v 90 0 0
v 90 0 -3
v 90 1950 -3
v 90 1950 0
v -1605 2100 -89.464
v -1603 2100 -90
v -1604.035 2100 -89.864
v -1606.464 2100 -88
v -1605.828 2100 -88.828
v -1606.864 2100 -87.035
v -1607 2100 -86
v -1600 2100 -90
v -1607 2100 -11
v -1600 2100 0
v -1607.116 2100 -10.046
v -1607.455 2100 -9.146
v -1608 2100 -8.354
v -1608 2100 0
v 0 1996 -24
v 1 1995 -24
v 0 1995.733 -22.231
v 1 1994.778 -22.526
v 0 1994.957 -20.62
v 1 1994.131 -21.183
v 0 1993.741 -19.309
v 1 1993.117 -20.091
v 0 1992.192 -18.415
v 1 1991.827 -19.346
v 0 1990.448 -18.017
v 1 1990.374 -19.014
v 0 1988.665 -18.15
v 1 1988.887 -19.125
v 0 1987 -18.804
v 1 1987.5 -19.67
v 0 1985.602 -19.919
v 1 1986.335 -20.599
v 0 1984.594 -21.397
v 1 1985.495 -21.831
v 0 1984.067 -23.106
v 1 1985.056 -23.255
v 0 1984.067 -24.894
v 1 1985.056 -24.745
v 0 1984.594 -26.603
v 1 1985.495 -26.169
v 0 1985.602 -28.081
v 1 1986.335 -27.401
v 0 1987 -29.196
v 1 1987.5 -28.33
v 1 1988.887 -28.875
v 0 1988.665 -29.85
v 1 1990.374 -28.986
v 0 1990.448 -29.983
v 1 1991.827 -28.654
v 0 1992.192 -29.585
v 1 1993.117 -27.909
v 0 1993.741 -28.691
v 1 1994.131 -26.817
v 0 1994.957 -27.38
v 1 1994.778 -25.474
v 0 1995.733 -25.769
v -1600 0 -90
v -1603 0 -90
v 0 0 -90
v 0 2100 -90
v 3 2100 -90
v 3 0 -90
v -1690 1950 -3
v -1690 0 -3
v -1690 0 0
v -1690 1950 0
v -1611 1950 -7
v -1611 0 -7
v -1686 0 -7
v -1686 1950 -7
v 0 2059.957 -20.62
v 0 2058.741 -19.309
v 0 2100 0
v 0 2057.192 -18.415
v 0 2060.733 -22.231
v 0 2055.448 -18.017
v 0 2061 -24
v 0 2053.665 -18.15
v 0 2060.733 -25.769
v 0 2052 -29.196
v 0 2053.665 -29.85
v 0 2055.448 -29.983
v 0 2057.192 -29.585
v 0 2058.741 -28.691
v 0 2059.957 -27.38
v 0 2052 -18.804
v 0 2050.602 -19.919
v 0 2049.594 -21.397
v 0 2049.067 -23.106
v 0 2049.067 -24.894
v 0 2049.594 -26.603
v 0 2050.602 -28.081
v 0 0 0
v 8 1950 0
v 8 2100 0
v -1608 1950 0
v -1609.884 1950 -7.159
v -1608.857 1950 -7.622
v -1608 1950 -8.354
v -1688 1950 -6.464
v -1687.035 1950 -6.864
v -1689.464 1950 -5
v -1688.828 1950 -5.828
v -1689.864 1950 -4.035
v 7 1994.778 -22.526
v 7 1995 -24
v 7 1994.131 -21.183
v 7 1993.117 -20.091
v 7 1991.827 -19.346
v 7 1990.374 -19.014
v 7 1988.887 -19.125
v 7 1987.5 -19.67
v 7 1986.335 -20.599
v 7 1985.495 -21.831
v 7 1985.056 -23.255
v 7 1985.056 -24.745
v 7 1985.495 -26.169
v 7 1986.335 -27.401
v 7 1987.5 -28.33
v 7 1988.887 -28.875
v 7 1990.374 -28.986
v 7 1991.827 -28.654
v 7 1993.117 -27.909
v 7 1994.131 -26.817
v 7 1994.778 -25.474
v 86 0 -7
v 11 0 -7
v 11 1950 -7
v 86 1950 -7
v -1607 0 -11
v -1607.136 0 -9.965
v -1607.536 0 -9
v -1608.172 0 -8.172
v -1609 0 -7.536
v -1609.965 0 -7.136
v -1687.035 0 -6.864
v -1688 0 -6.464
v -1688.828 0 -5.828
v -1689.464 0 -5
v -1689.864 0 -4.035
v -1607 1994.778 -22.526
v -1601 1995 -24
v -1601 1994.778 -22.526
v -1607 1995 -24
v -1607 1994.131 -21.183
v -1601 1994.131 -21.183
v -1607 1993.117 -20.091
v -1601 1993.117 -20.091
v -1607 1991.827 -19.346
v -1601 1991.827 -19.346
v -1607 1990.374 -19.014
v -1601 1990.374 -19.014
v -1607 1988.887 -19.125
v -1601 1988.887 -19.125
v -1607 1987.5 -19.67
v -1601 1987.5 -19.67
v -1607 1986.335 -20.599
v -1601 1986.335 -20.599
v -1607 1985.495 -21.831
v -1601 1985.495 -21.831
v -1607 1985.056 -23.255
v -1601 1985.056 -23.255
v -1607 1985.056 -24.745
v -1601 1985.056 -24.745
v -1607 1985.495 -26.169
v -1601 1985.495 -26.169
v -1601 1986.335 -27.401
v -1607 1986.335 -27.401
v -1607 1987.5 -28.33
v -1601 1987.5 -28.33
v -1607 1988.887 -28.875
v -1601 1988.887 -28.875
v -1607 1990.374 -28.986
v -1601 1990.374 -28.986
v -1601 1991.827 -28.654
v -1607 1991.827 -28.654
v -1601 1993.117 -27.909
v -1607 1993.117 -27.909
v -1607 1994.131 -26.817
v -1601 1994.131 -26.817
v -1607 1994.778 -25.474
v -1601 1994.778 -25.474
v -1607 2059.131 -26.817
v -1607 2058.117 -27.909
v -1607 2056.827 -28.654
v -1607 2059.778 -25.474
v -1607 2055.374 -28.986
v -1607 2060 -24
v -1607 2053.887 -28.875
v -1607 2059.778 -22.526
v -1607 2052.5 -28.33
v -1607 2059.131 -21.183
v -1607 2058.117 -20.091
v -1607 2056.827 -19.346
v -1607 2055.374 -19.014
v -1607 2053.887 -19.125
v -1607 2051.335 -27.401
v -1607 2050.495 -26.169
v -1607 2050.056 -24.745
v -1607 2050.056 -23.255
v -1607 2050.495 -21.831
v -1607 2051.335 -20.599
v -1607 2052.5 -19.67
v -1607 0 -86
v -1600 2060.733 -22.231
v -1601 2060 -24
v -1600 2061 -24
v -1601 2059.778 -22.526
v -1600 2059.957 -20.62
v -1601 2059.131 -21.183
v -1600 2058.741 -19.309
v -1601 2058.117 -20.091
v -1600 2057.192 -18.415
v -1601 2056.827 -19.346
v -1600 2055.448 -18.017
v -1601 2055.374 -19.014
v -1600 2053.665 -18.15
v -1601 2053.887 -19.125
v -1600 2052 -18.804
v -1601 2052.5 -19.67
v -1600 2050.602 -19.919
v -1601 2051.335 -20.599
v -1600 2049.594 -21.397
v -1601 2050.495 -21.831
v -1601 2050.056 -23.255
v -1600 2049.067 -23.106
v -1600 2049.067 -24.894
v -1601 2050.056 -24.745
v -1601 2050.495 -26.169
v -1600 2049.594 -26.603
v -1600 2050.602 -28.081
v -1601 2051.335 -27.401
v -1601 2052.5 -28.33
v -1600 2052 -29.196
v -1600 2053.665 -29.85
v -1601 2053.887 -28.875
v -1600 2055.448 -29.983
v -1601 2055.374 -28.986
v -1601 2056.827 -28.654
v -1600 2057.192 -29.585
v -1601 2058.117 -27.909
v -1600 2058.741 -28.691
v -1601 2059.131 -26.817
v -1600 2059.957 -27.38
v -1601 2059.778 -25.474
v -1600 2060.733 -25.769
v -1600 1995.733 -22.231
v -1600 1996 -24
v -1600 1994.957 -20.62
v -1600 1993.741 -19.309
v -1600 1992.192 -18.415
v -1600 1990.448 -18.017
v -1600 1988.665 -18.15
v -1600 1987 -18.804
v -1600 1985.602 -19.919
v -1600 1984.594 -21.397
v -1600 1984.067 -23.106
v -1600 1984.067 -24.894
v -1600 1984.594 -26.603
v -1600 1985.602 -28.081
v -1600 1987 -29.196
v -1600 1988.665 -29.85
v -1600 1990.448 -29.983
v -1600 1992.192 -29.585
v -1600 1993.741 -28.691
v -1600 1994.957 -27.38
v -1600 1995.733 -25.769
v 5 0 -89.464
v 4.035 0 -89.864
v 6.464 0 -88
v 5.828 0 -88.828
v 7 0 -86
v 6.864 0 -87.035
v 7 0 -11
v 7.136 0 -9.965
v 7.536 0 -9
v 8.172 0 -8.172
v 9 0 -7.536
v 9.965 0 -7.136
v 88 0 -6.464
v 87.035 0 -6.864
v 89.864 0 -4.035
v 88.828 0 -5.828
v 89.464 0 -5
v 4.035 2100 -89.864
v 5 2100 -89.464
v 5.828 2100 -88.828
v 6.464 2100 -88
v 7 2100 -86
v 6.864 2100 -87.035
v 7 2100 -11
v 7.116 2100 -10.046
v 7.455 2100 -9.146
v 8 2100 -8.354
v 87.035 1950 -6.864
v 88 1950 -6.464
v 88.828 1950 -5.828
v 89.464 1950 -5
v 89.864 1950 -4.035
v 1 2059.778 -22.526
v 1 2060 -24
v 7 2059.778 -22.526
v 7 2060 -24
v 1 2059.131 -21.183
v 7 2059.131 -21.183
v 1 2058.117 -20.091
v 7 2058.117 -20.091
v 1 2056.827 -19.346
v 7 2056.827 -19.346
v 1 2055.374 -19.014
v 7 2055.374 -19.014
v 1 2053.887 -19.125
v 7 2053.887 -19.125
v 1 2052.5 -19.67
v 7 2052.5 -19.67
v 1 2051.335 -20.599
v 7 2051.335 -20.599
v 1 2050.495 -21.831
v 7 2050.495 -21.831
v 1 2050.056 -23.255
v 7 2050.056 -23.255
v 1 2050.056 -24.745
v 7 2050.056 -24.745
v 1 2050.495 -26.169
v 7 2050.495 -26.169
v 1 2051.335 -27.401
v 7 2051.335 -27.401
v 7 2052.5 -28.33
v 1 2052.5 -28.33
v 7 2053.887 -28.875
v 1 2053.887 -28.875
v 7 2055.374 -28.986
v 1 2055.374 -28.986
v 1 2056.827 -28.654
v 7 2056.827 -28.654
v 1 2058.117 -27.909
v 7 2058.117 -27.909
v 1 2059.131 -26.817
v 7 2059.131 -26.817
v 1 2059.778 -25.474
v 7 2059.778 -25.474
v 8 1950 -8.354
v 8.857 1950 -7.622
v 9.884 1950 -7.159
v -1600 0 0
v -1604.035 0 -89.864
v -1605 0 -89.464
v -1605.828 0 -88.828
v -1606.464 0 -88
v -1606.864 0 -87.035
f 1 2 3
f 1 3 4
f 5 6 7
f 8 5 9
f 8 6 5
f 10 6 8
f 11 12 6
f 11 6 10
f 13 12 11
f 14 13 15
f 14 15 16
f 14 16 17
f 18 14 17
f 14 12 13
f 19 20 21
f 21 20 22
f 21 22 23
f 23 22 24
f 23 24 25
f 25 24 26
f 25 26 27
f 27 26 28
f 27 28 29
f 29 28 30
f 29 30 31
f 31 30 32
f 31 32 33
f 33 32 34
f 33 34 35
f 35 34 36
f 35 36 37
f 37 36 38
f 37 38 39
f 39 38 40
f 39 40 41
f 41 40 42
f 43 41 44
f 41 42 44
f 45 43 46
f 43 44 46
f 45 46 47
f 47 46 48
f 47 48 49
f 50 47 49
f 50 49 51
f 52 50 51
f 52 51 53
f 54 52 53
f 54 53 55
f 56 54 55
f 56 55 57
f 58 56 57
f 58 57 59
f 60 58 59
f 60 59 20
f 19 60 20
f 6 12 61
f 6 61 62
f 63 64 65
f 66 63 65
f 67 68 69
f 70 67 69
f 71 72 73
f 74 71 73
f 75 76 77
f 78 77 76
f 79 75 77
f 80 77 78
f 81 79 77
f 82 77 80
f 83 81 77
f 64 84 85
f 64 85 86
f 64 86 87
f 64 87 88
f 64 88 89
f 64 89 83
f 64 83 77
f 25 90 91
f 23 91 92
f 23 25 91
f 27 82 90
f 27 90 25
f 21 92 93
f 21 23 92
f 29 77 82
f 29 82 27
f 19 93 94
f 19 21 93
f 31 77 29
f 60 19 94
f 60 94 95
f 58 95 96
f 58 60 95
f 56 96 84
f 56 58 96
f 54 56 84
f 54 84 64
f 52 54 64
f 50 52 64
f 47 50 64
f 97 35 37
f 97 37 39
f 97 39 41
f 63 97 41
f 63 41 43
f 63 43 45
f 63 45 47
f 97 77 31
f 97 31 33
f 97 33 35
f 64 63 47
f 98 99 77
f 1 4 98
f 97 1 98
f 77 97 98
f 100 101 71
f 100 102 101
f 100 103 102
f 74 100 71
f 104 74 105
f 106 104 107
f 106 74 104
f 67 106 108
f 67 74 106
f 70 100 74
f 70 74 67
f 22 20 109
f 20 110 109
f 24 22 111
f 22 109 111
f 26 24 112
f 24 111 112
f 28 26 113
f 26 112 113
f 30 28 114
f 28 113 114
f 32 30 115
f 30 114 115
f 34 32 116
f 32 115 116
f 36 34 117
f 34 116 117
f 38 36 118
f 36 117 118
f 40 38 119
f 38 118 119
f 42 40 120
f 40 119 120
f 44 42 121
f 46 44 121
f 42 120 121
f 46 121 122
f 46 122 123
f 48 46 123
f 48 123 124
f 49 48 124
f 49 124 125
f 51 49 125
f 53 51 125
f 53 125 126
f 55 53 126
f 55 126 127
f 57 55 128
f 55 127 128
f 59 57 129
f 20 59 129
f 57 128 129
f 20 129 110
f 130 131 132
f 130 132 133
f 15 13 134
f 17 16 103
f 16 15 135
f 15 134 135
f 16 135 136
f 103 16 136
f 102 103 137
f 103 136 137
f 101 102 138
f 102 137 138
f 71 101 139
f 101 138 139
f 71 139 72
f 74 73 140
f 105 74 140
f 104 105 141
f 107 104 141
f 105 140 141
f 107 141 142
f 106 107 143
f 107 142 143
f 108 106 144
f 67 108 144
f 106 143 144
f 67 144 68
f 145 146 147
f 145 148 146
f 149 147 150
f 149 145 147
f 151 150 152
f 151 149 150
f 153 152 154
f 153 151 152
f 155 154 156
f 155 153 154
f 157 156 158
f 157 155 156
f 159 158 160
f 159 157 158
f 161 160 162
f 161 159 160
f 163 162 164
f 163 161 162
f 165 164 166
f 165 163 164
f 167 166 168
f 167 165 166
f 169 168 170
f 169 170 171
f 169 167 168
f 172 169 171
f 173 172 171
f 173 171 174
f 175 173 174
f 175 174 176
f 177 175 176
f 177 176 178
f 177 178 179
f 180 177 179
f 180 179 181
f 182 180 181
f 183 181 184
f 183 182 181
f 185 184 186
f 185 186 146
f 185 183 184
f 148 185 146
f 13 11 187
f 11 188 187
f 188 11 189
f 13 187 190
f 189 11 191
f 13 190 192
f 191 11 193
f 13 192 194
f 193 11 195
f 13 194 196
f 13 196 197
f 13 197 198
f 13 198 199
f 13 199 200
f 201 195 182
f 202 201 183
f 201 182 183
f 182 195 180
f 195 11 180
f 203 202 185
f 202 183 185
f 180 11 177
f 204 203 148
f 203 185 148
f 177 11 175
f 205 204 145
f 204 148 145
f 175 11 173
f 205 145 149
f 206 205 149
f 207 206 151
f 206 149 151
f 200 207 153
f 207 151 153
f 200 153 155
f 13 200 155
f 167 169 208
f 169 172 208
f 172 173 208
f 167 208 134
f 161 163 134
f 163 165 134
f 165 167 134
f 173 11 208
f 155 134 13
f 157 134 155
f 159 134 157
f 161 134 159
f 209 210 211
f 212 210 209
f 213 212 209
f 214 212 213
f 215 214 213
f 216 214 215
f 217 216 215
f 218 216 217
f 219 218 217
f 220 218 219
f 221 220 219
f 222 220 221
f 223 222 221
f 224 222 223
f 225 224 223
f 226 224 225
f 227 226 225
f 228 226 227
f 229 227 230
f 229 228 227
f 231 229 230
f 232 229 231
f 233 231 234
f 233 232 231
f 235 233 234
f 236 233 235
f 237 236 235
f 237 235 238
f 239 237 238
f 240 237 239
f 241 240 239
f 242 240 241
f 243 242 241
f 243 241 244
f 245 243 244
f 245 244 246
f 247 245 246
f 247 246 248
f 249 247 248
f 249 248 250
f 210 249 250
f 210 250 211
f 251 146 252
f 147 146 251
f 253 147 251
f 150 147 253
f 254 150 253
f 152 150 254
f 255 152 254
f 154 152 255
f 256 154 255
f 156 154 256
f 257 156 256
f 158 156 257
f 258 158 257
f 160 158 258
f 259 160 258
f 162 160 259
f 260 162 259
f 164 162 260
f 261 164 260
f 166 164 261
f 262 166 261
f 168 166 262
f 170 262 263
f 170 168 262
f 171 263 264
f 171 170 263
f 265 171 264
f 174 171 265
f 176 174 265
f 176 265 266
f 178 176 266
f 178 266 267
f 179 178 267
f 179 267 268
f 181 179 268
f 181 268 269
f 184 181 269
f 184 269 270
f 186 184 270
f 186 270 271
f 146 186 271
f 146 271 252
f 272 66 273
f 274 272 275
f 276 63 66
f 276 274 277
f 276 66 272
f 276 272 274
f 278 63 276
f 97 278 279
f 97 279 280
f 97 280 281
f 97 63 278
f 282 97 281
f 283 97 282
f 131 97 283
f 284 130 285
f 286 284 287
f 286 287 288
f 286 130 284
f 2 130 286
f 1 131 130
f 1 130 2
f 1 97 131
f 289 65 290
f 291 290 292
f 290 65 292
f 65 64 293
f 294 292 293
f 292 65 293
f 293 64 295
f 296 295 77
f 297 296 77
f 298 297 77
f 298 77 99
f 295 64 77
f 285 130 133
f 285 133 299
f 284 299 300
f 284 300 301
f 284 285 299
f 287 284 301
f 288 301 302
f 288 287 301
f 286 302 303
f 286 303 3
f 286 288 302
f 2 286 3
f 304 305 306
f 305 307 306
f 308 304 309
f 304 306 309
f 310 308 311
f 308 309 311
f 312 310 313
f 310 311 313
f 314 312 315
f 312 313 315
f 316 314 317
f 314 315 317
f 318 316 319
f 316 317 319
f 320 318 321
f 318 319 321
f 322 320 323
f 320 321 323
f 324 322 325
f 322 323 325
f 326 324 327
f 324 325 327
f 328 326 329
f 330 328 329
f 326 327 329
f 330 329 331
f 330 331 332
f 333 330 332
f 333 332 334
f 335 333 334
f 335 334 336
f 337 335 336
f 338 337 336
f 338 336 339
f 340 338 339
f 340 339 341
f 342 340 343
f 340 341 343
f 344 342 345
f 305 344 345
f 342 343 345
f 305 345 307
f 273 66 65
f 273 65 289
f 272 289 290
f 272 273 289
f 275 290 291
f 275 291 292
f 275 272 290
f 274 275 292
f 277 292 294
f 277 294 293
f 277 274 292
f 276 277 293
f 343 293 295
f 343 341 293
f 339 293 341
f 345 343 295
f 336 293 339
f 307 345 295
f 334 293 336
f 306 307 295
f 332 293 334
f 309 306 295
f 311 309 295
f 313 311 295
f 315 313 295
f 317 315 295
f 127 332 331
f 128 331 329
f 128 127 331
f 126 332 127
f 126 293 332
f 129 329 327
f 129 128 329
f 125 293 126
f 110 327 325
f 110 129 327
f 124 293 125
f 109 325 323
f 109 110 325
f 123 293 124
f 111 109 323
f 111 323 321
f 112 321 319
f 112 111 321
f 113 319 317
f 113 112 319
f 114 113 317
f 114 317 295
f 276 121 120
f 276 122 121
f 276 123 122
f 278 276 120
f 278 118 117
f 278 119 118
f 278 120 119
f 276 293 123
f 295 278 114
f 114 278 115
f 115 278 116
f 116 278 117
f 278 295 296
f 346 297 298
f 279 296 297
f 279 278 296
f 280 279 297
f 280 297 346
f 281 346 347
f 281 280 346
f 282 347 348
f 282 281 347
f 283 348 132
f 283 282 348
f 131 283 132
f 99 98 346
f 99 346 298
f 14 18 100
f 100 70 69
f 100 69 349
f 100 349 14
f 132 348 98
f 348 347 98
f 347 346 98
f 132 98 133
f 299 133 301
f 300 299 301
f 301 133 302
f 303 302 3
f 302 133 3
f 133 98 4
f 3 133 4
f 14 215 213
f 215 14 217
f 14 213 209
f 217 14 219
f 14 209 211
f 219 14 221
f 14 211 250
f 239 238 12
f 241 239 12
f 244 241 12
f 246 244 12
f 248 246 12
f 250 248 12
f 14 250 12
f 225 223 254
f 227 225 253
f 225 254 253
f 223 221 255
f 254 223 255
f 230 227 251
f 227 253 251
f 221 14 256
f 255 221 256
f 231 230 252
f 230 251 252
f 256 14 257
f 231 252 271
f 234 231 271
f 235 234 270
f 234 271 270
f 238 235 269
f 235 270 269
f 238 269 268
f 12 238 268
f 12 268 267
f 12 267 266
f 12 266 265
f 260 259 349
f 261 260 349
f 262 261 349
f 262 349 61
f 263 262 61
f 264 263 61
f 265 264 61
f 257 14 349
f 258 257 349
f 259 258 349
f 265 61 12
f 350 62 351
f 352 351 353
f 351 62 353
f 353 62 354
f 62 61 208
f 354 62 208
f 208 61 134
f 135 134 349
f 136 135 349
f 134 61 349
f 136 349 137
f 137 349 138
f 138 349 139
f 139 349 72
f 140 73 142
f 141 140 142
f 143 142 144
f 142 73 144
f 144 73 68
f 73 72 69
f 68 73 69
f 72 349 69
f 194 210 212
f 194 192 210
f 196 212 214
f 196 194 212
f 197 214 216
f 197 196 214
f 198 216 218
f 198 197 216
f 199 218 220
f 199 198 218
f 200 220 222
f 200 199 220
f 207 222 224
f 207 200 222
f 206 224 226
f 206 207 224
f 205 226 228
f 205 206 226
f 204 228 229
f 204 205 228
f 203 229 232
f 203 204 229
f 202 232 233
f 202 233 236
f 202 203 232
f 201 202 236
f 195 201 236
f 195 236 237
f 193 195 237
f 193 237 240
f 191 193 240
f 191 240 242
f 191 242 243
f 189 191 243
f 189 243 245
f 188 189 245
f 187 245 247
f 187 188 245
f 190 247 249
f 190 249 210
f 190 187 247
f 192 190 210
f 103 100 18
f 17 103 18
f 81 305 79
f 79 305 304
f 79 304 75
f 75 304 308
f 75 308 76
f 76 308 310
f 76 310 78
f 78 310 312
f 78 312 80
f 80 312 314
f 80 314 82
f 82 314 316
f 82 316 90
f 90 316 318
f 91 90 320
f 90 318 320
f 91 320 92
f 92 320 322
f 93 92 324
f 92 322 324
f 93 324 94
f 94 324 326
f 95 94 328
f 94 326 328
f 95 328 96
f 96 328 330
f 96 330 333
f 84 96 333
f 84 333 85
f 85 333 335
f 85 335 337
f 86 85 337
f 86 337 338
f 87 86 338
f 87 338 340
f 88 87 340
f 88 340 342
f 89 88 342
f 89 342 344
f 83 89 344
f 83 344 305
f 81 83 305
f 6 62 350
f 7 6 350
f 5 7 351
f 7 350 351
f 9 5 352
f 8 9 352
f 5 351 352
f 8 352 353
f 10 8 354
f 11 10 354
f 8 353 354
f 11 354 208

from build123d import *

# Parameters (mm, degrees)
F1_DEPTH       = 2100
F2_W           = 90
F2_H           = 150
F3_DEPTH       = 25
F5_D           = 10
F5_DEPTH       = 30
F5_CSINK_D     = 12
F5_CSINK_ANGLE = 90


with BuildPart() as f1:
    # F0 (on Front) → F1 (new body)
    with BuildSketch(Plane.XZ):
        with BuildLine():
            Line((90, 0), (0, 0))
            Line((0, 0), (0, -90))
            Line((0, -90), (3, -90))
            ThreePointArc((3, -90), (5.828427, -88.828427), (7, -86))
            Line((7, -86), (7, -11))
            ThreePointArc((7, -11), (8.171573, -8.171573), (11, -7))
            Line((11, -7), (86, -7))
            ThreePointArc((86, -7), (88.828427, -5.828427), (90, -3))
            Line((90, -3), (90, 0))
        make_face()
    extrude(amount=-F1_DEPTH)

    # F2 (on face) → F3 (cut)
    with BuildSketch(Plane.XY):
        with Locations((53, 2025)):
            Rectangle(F2_W, F2_H)
    extrude(amount=-F3_DEPTH, mode=Mode.SUBTRACT)

    # F5
    with Locations(Plane(origin=(0, 0, 0), x_dir=(0, -1, 0), z_dir=(-1, 0, 0))):
        with Locations((-2055, -24), (-1990, -24)):
            CounterSinkHole(F5_D / 2, F5_CSINK_D / 2, depth=F5_DEPTH, counter_sink_angle=F5_CSINK_ANGLE)


with BuildPart() as f7_1:
    # F7: instance of F1
    add(f1.part.mirror(Plane.YZ.offset(-800)))


solid = Compound([f1.part, f7_1.part])
